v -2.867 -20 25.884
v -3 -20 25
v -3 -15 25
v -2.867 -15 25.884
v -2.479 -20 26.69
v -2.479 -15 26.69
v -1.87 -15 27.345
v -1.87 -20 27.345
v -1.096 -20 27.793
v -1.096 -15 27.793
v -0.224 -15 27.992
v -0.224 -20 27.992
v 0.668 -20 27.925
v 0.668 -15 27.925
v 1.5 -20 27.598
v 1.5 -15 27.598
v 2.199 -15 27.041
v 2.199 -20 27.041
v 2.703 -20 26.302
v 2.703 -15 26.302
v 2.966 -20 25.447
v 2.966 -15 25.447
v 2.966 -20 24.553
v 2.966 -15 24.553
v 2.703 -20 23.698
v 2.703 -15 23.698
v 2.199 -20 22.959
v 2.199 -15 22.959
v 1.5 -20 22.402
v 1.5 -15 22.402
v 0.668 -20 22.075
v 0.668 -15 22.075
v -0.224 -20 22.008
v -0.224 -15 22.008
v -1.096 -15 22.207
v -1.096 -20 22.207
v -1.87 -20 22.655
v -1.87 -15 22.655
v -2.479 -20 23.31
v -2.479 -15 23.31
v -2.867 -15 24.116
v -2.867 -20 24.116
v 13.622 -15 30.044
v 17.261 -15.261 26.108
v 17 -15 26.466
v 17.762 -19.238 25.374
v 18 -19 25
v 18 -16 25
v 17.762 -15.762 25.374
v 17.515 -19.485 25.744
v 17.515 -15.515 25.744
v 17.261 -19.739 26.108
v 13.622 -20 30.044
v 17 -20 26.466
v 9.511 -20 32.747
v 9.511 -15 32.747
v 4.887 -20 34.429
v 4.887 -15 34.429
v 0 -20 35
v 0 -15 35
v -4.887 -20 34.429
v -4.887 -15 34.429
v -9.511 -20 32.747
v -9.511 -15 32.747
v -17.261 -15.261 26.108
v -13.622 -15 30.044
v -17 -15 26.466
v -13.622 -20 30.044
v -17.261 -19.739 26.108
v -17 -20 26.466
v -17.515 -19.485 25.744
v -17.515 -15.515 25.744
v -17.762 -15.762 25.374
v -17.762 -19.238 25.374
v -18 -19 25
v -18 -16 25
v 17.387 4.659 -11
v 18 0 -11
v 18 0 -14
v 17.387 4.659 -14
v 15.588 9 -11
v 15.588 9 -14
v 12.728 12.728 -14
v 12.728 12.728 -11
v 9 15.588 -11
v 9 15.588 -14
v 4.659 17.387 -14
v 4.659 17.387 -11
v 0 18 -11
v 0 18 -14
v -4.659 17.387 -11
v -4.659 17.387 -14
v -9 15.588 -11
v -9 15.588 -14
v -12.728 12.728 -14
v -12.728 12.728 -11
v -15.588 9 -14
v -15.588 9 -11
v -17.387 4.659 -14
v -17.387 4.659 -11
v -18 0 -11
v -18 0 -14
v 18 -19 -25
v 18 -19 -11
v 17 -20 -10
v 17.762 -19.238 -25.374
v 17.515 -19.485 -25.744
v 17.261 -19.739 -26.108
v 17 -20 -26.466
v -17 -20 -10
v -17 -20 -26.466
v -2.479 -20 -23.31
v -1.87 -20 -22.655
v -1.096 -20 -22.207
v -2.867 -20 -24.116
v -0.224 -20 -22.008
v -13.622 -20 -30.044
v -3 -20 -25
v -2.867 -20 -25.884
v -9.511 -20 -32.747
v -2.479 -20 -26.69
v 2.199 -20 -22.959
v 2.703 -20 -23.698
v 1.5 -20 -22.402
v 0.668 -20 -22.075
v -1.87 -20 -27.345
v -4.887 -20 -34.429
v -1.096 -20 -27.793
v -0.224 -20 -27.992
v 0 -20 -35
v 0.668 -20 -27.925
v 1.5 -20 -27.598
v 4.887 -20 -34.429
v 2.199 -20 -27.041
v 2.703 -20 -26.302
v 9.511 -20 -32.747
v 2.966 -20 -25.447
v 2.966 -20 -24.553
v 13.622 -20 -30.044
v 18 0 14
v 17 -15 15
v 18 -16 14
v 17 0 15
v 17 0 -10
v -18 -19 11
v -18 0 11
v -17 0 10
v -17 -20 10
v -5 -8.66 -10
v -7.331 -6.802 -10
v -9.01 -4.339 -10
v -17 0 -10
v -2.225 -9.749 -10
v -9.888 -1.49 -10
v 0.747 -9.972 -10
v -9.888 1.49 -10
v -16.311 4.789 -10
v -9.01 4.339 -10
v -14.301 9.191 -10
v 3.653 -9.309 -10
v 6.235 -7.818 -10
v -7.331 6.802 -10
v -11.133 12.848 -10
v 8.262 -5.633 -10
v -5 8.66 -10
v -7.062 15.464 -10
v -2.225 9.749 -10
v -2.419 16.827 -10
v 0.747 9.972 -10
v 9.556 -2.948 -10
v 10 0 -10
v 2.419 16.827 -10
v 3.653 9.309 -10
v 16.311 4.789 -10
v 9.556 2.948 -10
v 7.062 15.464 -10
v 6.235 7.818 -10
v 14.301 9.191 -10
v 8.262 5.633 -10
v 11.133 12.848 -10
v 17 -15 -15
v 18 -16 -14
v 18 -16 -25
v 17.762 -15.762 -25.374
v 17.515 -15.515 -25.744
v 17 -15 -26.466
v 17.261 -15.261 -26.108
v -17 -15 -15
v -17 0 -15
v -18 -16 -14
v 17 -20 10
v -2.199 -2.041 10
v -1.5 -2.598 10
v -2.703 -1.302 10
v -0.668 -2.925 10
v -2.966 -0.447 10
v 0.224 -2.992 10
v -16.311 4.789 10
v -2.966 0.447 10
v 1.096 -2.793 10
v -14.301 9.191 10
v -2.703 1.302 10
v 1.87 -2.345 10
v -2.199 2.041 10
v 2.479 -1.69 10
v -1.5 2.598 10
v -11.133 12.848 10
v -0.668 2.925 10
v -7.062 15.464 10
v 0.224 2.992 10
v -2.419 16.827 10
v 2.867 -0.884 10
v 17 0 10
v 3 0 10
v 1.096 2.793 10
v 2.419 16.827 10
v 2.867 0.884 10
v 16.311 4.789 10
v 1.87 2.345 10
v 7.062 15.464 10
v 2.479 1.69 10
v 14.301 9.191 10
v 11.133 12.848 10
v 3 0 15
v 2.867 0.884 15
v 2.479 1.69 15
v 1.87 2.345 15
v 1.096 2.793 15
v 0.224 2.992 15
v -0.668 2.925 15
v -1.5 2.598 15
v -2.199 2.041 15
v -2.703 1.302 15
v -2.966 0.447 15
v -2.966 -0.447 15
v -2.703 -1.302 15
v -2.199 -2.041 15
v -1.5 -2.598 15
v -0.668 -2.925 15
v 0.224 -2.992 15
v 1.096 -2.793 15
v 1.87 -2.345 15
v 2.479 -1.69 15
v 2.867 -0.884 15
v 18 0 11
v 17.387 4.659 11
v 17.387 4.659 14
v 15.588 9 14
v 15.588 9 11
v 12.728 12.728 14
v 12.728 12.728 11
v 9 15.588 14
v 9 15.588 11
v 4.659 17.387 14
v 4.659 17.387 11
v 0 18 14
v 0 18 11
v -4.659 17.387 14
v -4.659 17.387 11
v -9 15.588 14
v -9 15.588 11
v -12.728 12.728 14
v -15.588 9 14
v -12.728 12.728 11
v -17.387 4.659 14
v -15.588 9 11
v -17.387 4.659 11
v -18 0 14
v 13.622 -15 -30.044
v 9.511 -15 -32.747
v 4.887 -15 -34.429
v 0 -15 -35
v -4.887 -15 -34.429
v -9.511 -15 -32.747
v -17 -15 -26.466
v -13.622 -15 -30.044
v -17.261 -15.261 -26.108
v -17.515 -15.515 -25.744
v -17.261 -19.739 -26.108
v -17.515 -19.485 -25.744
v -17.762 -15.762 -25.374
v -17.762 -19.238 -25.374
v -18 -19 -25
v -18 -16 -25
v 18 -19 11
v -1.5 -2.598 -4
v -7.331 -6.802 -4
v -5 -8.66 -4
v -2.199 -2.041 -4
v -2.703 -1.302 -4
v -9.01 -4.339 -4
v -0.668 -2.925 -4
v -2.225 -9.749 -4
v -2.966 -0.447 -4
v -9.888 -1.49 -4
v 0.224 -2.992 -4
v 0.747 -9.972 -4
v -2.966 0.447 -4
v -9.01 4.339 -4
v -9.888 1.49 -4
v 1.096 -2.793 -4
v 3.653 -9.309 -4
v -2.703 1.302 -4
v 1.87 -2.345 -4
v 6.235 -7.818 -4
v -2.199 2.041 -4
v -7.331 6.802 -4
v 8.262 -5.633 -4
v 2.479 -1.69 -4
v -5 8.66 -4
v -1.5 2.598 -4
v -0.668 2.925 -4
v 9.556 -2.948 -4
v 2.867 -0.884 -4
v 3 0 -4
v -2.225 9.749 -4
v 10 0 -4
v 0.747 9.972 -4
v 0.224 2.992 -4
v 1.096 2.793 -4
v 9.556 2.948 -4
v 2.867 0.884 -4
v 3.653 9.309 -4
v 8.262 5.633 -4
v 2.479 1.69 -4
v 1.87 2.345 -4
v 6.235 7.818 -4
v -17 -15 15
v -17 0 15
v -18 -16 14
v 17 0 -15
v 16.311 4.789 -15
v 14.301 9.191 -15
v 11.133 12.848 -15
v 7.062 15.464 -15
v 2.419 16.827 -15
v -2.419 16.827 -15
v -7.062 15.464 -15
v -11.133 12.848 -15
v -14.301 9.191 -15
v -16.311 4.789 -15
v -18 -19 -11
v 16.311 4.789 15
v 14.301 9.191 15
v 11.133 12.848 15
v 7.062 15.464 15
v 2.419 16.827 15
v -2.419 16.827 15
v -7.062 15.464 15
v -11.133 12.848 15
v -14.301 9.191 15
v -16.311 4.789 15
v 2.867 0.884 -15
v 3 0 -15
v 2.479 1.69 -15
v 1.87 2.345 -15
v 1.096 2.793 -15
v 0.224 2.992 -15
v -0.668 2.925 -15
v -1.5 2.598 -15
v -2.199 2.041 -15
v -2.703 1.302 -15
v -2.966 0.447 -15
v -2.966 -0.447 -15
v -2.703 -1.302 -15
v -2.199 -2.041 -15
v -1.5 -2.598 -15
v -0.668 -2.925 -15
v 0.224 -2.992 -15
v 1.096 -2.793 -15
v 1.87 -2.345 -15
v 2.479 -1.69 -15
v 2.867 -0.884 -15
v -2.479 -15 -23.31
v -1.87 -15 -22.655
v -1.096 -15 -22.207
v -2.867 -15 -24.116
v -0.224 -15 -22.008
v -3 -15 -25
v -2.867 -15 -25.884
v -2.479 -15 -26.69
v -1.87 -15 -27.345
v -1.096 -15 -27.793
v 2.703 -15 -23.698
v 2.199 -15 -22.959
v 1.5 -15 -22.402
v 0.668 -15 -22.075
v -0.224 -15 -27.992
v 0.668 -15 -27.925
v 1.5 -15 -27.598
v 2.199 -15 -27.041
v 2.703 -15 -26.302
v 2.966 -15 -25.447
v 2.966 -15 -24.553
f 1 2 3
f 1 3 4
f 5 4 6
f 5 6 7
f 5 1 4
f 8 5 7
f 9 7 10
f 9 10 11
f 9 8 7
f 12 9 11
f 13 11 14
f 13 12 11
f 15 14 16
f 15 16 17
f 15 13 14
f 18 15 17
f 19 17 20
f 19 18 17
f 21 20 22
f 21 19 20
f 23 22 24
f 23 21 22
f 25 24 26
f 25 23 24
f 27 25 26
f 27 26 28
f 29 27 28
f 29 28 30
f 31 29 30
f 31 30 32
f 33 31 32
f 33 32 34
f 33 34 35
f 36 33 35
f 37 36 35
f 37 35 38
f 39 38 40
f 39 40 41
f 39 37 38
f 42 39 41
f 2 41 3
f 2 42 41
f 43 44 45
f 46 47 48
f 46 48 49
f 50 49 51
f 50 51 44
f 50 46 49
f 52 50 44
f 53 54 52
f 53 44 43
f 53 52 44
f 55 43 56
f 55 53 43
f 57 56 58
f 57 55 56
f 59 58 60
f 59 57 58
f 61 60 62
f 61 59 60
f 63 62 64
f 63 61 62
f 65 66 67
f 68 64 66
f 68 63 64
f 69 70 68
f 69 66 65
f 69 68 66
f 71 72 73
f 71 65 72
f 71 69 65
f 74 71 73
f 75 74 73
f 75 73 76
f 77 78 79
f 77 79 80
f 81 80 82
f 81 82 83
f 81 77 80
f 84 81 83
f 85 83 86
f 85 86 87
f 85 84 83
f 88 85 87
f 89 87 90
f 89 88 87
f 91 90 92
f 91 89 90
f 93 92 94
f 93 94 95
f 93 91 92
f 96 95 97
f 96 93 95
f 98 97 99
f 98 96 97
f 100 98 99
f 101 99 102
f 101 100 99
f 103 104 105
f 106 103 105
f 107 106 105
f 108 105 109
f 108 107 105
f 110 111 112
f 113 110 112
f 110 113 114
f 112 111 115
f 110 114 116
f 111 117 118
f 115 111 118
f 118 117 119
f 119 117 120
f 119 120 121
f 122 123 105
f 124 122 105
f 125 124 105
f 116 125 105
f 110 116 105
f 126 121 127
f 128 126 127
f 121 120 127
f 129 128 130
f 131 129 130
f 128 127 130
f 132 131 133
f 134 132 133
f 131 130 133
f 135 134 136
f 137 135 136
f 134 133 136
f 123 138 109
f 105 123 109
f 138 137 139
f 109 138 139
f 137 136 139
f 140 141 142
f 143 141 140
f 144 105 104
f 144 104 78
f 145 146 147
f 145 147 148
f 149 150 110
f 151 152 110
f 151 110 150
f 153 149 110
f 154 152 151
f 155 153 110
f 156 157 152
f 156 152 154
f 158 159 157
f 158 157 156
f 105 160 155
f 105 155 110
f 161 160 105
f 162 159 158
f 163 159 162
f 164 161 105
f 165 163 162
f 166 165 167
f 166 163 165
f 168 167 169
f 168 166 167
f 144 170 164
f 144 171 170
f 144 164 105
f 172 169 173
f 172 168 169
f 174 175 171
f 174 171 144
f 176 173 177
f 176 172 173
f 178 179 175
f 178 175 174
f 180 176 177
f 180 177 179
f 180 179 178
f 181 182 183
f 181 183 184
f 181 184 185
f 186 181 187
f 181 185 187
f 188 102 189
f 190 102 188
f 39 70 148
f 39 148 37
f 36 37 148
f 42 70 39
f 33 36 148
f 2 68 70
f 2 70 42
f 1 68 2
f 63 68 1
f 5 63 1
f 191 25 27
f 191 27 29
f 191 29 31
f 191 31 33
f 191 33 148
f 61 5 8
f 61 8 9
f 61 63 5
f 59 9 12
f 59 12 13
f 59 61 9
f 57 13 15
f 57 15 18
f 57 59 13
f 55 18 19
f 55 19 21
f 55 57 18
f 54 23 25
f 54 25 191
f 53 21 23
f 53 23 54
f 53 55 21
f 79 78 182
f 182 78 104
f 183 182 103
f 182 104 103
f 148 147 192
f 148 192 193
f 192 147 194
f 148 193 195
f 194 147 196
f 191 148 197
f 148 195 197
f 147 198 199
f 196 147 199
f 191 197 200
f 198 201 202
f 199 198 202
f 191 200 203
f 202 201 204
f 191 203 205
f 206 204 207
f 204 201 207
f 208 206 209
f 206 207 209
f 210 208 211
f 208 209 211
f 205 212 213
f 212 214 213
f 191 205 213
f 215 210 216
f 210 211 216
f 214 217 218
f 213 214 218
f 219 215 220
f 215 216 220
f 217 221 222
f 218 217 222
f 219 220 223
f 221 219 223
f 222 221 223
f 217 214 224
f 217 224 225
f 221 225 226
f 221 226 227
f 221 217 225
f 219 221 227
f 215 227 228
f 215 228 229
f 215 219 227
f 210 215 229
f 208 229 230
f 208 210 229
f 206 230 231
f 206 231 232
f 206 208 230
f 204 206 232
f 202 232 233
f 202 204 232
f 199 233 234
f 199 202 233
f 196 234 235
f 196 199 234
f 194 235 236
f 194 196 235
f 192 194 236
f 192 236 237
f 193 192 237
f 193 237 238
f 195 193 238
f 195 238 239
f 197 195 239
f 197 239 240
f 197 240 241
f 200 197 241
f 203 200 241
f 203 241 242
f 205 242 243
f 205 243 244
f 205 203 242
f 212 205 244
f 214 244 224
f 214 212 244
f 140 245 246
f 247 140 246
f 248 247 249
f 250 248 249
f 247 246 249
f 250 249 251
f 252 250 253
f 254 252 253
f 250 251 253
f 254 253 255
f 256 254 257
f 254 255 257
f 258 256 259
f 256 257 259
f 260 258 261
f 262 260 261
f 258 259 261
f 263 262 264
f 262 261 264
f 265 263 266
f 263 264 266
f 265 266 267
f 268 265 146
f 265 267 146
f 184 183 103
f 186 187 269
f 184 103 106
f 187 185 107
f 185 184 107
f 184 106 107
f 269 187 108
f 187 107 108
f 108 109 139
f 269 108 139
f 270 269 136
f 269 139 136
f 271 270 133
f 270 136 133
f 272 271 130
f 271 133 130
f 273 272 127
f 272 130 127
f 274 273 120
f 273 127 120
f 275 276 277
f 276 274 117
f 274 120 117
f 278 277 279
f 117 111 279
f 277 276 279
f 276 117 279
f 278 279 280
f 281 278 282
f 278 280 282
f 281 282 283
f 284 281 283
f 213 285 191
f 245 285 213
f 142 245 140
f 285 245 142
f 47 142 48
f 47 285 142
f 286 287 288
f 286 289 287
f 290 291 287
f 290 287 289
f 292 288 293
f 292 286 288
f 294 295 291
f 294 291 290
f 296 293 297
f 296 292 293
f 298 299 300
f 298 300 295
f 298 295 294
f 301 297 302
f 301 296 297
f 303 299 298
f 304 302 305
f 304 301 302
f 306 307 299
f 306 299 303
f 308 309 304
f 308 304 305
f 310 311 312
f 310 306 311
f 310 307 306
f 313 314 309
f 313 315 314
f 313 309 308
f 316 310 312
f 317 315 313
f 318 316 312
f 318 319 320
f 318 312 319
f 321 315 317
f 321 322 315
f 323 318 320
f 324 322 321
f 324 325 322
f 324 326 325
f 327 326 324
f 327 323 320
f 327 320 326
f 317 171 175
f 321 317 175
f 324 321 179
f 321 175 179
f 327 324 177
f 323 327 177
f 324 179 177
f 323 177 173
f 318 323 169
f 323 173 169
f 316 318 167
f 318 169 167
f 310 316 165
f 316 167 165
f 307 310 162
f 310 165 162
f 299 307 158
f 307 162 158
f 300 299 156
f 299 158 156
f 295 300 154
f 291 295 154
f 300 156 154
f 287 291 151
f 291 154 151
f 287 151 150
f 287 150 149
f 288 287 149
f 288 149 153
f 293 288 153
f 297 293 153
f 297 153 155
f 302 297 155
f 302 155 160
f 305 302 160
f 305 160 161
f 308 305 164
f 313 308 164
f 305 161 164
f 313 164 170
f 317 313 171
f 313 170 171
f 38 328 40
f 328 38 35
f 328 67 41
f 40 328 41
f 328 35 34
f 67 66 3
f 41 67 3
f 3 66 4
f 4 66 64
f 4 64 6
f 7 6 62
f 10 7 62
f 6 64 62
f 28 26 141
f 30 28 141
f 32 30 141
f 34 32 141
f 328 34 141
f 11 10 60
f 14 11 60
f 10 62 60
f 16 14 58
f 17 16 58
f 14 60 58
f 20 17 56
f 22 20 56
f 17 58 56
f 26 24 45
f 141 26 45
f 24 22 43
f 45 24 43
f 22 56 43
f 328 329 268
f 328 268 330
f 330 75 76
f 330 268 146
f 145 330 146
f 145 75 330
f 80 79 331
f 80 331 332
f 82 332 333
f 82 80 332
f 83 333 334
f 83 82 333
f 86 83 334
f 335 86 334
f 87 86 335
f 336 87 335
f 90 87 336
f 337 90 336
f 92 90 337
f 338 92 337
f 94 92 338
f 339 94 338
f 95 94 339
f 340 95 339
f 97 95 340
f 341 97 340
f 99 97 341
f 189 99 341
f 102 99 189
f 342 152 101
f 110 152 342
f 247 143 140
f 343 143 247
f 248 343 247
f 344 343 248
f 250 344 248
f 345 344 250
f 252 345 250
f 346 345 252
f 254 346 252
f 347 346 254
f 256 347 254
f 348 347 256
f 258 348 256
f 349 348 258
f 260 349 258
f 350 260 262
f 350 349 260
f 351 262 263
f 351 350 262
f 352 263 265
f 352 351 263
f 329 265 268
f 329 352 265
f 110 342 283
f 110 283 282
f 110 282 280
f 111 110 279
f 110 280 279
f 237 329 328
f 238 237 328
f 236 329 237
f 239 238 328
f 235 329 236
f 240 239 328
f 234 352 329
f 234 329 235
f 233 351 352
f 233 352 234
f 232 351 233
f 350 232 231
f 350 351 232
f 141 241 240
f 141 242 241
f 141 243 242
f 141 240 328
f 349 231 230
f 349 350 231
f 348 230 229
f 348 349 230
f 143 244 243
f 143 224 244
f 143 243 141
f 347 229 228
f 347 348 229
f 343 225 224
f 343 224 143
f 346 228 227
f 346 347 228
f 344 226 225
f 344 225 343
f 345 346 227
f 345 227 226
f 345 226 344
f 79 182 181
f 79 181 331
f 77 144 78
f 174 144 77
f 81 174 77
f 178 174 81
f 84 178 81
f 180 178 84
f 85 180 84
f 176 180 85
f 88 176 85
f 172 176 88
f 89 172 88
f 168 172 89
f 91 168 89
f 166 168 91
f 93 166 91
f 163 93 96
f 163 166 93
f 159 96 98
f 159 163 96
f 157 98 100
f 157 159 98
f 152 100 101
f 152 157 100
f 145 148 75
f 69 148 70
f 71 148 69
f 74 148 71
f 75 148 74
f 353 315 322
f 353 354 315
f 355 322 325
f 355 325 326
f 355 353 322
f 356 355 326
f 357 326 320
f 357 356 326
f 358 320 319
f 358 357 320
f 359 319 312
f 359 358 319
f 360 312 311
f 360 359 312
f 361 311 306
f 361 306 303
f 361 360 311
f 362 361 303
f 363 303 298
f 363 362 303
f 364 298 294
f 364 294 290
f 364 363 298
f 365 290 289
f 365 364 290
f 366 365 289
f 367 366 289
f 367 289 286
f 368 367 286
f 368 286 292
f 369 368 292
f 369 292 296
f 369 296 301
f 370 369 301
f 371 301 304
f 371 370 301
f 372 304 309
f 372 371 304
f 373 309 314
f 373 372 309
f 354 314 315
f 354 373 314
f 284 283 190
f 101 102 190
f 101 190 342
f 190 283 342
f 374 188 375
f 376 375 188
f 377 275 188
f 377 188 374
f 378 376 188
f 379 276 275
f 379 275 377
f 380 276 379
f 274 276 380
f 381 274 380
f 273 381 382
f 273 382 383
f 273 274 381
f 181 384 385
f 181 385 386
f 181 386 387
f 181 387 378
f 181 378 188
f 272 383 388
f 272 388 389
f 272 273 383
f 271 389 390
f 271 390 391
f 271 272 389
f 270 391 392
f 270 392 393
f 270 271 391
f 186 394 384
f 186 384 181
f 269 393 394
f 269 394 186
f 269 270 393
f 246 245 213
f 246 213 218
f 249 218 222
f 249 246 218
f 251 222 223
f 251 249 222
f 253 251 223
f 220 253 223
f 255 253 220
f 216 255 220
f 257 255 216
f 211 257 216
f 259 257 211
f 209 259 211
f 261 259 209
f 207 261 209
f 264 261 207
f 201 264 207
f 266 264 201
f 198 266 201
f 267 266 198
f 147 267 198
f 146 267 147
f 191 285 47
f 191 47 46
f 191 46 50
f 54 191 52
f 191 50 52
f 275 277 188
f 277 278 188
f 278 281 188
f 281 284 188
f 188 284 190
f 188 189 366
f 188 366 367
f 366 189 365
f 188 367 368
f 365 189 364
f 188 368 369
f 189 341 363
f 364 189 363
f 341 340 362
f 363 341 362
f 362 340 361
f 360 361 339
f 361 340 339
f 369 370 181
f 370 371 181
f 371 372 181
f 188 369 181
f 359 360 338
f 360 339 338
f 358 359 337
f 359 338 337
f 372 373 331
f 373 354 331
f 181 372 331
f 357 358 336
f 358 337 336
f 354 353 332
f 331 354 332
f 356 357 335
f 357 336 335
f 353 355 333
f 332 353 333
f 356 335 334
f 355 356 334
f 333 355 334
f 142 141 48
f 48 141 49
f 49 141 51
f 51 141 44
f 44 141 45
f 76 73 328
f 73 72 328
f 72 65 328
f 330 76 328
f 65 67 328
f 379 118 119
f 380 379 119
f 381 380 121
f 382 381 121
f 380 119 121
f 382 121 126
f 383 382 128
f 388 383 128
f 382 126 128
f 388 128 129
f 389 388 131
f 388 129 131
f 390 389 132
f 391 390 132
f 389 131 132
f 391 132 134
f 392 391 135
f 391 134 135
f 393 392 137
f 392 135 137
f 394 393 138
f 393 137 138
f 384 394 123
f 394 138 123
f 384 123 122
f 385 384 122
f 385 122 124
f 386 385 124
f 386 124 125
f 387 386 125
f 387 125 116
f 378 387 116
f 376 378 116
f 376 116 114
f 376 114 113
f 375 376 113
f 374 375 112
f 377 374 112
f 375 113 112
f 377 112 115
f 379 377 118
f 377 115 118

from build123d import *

# Parameters (mm, degrees)
SKETCH1_R           = 3
BOSS_EXTRUDE1_DEPTH = 5
BOSS_EXTRUDE3_DEPTH = 5
SKETCH4_R           = 10
SKETCH4_R_2         = 3
BOSS_EXTRUDE4_DEPTH = 6
CHAMFER1_SIZE       = 1
CHAMFER2_SIZE       = 1


with BuildPart() as part:
    # Sketch1 → Boss-Extrude1 (new body)
    with BuildSketch(Plane.XY):
        with BuildLine():
            Line((-18, -20), (18, -20))
            Line((18, -20), (18, 0))
            ThreePointArc((18, 0), (0, 18), (-18, 0))
            Line((-18, 0), (-18, -20))
        make_face()
        Circle(SKETCH1_R, mode=Mode.SUBTRACT)
    extrude(amount=BOSS_EXTRUDE1_DEPTH)

    # Sketch3 → Boss-Extrude3 (add)
    with BuildSketch(Plane.XZ.offset(20)):
        with BuildLine():
            Line((-18, 15), (-18, 0))
            Line((-18, 0), (18, 0))
            Line((18, 0), (18, 15))
            Line((18, 15), (3, 15))
            ThreePointArc((3, 15), (0, 12), (-3, 15))
            Line((-3, 15), (-18, 15))
        make_face()
        with BuildLine():
            ThreePointArc((18, 15), (0, 25), (-18, 15))
            Line((-18, 15), (-3, 15))
            ThreePointArc((-3, 15), (0, 18), (3, 15))
            Line((3, 15), (18, 15))
        make_face()
    extrude(amount=-BOSS_EXTRUDE3_DEPTH)


with BuildPart() as body_2:
    # Mirror2: mirrored copy
    add(part.part.mirror(Plane.XY))


with BuildPart() as part_1:
    # Body-Move/Copy2: moved
    add(part.part.moved(Location((0, 0, 10))))

    # Chamfer1
    chamfer1_edges = [part_1.edges().sort_by_distance(p)[0] for p in [
        (0, 18, 15),
        (18, -7.5, 15),
        (18, -15, 20),
        (-18, -15, 20),
        (-18, -7.5, 15),
        (0, 18, 10),
        (18, -10, 10),
        (-18, -10, 10),
        (18, -20, 17.5),
        (-18, -20, 17.5),
    ]]
    chamfer(chamfer1_edges, length=CHAMFER1_SIZE)


with BuildPart() as body_2_1:
    # Body-Move/Copy3: moved
    add(body_2.part.moved(Location((0, 0, -10))))

    # Sketch4 → Boss-Extrude4 (add)
    with BuildSketch(Plane.XY.offset(-10)):
        Circle(SKETCH4_R)
        Circle(SKETCH4_R_2, mode=Mode.SUBTRACT)
    extrude(amount=BOSS_EXTRUDE4_DEPTH)

    # Chamfer2
    chamfer2_edges = [body_2_1.edges().sort_by_distance(p)[0] for p in [
        (0, 18, -15),
        (18, -7.5, -15),
        (18, -15, -20),
        (-18, -15, -20),
        (-18, -7.5, -15),
        (0, 18, -10),
        (18, -10, -10),
        (-18, -10, -10),
        (18, -20, -17.5),
        (-18, -20, -17.5),
    ]]
    chamfer(chamfer2_edges, length=CHAMFER2_SIZE)


solid = Compound([part_1.part, body_2_1.part])
